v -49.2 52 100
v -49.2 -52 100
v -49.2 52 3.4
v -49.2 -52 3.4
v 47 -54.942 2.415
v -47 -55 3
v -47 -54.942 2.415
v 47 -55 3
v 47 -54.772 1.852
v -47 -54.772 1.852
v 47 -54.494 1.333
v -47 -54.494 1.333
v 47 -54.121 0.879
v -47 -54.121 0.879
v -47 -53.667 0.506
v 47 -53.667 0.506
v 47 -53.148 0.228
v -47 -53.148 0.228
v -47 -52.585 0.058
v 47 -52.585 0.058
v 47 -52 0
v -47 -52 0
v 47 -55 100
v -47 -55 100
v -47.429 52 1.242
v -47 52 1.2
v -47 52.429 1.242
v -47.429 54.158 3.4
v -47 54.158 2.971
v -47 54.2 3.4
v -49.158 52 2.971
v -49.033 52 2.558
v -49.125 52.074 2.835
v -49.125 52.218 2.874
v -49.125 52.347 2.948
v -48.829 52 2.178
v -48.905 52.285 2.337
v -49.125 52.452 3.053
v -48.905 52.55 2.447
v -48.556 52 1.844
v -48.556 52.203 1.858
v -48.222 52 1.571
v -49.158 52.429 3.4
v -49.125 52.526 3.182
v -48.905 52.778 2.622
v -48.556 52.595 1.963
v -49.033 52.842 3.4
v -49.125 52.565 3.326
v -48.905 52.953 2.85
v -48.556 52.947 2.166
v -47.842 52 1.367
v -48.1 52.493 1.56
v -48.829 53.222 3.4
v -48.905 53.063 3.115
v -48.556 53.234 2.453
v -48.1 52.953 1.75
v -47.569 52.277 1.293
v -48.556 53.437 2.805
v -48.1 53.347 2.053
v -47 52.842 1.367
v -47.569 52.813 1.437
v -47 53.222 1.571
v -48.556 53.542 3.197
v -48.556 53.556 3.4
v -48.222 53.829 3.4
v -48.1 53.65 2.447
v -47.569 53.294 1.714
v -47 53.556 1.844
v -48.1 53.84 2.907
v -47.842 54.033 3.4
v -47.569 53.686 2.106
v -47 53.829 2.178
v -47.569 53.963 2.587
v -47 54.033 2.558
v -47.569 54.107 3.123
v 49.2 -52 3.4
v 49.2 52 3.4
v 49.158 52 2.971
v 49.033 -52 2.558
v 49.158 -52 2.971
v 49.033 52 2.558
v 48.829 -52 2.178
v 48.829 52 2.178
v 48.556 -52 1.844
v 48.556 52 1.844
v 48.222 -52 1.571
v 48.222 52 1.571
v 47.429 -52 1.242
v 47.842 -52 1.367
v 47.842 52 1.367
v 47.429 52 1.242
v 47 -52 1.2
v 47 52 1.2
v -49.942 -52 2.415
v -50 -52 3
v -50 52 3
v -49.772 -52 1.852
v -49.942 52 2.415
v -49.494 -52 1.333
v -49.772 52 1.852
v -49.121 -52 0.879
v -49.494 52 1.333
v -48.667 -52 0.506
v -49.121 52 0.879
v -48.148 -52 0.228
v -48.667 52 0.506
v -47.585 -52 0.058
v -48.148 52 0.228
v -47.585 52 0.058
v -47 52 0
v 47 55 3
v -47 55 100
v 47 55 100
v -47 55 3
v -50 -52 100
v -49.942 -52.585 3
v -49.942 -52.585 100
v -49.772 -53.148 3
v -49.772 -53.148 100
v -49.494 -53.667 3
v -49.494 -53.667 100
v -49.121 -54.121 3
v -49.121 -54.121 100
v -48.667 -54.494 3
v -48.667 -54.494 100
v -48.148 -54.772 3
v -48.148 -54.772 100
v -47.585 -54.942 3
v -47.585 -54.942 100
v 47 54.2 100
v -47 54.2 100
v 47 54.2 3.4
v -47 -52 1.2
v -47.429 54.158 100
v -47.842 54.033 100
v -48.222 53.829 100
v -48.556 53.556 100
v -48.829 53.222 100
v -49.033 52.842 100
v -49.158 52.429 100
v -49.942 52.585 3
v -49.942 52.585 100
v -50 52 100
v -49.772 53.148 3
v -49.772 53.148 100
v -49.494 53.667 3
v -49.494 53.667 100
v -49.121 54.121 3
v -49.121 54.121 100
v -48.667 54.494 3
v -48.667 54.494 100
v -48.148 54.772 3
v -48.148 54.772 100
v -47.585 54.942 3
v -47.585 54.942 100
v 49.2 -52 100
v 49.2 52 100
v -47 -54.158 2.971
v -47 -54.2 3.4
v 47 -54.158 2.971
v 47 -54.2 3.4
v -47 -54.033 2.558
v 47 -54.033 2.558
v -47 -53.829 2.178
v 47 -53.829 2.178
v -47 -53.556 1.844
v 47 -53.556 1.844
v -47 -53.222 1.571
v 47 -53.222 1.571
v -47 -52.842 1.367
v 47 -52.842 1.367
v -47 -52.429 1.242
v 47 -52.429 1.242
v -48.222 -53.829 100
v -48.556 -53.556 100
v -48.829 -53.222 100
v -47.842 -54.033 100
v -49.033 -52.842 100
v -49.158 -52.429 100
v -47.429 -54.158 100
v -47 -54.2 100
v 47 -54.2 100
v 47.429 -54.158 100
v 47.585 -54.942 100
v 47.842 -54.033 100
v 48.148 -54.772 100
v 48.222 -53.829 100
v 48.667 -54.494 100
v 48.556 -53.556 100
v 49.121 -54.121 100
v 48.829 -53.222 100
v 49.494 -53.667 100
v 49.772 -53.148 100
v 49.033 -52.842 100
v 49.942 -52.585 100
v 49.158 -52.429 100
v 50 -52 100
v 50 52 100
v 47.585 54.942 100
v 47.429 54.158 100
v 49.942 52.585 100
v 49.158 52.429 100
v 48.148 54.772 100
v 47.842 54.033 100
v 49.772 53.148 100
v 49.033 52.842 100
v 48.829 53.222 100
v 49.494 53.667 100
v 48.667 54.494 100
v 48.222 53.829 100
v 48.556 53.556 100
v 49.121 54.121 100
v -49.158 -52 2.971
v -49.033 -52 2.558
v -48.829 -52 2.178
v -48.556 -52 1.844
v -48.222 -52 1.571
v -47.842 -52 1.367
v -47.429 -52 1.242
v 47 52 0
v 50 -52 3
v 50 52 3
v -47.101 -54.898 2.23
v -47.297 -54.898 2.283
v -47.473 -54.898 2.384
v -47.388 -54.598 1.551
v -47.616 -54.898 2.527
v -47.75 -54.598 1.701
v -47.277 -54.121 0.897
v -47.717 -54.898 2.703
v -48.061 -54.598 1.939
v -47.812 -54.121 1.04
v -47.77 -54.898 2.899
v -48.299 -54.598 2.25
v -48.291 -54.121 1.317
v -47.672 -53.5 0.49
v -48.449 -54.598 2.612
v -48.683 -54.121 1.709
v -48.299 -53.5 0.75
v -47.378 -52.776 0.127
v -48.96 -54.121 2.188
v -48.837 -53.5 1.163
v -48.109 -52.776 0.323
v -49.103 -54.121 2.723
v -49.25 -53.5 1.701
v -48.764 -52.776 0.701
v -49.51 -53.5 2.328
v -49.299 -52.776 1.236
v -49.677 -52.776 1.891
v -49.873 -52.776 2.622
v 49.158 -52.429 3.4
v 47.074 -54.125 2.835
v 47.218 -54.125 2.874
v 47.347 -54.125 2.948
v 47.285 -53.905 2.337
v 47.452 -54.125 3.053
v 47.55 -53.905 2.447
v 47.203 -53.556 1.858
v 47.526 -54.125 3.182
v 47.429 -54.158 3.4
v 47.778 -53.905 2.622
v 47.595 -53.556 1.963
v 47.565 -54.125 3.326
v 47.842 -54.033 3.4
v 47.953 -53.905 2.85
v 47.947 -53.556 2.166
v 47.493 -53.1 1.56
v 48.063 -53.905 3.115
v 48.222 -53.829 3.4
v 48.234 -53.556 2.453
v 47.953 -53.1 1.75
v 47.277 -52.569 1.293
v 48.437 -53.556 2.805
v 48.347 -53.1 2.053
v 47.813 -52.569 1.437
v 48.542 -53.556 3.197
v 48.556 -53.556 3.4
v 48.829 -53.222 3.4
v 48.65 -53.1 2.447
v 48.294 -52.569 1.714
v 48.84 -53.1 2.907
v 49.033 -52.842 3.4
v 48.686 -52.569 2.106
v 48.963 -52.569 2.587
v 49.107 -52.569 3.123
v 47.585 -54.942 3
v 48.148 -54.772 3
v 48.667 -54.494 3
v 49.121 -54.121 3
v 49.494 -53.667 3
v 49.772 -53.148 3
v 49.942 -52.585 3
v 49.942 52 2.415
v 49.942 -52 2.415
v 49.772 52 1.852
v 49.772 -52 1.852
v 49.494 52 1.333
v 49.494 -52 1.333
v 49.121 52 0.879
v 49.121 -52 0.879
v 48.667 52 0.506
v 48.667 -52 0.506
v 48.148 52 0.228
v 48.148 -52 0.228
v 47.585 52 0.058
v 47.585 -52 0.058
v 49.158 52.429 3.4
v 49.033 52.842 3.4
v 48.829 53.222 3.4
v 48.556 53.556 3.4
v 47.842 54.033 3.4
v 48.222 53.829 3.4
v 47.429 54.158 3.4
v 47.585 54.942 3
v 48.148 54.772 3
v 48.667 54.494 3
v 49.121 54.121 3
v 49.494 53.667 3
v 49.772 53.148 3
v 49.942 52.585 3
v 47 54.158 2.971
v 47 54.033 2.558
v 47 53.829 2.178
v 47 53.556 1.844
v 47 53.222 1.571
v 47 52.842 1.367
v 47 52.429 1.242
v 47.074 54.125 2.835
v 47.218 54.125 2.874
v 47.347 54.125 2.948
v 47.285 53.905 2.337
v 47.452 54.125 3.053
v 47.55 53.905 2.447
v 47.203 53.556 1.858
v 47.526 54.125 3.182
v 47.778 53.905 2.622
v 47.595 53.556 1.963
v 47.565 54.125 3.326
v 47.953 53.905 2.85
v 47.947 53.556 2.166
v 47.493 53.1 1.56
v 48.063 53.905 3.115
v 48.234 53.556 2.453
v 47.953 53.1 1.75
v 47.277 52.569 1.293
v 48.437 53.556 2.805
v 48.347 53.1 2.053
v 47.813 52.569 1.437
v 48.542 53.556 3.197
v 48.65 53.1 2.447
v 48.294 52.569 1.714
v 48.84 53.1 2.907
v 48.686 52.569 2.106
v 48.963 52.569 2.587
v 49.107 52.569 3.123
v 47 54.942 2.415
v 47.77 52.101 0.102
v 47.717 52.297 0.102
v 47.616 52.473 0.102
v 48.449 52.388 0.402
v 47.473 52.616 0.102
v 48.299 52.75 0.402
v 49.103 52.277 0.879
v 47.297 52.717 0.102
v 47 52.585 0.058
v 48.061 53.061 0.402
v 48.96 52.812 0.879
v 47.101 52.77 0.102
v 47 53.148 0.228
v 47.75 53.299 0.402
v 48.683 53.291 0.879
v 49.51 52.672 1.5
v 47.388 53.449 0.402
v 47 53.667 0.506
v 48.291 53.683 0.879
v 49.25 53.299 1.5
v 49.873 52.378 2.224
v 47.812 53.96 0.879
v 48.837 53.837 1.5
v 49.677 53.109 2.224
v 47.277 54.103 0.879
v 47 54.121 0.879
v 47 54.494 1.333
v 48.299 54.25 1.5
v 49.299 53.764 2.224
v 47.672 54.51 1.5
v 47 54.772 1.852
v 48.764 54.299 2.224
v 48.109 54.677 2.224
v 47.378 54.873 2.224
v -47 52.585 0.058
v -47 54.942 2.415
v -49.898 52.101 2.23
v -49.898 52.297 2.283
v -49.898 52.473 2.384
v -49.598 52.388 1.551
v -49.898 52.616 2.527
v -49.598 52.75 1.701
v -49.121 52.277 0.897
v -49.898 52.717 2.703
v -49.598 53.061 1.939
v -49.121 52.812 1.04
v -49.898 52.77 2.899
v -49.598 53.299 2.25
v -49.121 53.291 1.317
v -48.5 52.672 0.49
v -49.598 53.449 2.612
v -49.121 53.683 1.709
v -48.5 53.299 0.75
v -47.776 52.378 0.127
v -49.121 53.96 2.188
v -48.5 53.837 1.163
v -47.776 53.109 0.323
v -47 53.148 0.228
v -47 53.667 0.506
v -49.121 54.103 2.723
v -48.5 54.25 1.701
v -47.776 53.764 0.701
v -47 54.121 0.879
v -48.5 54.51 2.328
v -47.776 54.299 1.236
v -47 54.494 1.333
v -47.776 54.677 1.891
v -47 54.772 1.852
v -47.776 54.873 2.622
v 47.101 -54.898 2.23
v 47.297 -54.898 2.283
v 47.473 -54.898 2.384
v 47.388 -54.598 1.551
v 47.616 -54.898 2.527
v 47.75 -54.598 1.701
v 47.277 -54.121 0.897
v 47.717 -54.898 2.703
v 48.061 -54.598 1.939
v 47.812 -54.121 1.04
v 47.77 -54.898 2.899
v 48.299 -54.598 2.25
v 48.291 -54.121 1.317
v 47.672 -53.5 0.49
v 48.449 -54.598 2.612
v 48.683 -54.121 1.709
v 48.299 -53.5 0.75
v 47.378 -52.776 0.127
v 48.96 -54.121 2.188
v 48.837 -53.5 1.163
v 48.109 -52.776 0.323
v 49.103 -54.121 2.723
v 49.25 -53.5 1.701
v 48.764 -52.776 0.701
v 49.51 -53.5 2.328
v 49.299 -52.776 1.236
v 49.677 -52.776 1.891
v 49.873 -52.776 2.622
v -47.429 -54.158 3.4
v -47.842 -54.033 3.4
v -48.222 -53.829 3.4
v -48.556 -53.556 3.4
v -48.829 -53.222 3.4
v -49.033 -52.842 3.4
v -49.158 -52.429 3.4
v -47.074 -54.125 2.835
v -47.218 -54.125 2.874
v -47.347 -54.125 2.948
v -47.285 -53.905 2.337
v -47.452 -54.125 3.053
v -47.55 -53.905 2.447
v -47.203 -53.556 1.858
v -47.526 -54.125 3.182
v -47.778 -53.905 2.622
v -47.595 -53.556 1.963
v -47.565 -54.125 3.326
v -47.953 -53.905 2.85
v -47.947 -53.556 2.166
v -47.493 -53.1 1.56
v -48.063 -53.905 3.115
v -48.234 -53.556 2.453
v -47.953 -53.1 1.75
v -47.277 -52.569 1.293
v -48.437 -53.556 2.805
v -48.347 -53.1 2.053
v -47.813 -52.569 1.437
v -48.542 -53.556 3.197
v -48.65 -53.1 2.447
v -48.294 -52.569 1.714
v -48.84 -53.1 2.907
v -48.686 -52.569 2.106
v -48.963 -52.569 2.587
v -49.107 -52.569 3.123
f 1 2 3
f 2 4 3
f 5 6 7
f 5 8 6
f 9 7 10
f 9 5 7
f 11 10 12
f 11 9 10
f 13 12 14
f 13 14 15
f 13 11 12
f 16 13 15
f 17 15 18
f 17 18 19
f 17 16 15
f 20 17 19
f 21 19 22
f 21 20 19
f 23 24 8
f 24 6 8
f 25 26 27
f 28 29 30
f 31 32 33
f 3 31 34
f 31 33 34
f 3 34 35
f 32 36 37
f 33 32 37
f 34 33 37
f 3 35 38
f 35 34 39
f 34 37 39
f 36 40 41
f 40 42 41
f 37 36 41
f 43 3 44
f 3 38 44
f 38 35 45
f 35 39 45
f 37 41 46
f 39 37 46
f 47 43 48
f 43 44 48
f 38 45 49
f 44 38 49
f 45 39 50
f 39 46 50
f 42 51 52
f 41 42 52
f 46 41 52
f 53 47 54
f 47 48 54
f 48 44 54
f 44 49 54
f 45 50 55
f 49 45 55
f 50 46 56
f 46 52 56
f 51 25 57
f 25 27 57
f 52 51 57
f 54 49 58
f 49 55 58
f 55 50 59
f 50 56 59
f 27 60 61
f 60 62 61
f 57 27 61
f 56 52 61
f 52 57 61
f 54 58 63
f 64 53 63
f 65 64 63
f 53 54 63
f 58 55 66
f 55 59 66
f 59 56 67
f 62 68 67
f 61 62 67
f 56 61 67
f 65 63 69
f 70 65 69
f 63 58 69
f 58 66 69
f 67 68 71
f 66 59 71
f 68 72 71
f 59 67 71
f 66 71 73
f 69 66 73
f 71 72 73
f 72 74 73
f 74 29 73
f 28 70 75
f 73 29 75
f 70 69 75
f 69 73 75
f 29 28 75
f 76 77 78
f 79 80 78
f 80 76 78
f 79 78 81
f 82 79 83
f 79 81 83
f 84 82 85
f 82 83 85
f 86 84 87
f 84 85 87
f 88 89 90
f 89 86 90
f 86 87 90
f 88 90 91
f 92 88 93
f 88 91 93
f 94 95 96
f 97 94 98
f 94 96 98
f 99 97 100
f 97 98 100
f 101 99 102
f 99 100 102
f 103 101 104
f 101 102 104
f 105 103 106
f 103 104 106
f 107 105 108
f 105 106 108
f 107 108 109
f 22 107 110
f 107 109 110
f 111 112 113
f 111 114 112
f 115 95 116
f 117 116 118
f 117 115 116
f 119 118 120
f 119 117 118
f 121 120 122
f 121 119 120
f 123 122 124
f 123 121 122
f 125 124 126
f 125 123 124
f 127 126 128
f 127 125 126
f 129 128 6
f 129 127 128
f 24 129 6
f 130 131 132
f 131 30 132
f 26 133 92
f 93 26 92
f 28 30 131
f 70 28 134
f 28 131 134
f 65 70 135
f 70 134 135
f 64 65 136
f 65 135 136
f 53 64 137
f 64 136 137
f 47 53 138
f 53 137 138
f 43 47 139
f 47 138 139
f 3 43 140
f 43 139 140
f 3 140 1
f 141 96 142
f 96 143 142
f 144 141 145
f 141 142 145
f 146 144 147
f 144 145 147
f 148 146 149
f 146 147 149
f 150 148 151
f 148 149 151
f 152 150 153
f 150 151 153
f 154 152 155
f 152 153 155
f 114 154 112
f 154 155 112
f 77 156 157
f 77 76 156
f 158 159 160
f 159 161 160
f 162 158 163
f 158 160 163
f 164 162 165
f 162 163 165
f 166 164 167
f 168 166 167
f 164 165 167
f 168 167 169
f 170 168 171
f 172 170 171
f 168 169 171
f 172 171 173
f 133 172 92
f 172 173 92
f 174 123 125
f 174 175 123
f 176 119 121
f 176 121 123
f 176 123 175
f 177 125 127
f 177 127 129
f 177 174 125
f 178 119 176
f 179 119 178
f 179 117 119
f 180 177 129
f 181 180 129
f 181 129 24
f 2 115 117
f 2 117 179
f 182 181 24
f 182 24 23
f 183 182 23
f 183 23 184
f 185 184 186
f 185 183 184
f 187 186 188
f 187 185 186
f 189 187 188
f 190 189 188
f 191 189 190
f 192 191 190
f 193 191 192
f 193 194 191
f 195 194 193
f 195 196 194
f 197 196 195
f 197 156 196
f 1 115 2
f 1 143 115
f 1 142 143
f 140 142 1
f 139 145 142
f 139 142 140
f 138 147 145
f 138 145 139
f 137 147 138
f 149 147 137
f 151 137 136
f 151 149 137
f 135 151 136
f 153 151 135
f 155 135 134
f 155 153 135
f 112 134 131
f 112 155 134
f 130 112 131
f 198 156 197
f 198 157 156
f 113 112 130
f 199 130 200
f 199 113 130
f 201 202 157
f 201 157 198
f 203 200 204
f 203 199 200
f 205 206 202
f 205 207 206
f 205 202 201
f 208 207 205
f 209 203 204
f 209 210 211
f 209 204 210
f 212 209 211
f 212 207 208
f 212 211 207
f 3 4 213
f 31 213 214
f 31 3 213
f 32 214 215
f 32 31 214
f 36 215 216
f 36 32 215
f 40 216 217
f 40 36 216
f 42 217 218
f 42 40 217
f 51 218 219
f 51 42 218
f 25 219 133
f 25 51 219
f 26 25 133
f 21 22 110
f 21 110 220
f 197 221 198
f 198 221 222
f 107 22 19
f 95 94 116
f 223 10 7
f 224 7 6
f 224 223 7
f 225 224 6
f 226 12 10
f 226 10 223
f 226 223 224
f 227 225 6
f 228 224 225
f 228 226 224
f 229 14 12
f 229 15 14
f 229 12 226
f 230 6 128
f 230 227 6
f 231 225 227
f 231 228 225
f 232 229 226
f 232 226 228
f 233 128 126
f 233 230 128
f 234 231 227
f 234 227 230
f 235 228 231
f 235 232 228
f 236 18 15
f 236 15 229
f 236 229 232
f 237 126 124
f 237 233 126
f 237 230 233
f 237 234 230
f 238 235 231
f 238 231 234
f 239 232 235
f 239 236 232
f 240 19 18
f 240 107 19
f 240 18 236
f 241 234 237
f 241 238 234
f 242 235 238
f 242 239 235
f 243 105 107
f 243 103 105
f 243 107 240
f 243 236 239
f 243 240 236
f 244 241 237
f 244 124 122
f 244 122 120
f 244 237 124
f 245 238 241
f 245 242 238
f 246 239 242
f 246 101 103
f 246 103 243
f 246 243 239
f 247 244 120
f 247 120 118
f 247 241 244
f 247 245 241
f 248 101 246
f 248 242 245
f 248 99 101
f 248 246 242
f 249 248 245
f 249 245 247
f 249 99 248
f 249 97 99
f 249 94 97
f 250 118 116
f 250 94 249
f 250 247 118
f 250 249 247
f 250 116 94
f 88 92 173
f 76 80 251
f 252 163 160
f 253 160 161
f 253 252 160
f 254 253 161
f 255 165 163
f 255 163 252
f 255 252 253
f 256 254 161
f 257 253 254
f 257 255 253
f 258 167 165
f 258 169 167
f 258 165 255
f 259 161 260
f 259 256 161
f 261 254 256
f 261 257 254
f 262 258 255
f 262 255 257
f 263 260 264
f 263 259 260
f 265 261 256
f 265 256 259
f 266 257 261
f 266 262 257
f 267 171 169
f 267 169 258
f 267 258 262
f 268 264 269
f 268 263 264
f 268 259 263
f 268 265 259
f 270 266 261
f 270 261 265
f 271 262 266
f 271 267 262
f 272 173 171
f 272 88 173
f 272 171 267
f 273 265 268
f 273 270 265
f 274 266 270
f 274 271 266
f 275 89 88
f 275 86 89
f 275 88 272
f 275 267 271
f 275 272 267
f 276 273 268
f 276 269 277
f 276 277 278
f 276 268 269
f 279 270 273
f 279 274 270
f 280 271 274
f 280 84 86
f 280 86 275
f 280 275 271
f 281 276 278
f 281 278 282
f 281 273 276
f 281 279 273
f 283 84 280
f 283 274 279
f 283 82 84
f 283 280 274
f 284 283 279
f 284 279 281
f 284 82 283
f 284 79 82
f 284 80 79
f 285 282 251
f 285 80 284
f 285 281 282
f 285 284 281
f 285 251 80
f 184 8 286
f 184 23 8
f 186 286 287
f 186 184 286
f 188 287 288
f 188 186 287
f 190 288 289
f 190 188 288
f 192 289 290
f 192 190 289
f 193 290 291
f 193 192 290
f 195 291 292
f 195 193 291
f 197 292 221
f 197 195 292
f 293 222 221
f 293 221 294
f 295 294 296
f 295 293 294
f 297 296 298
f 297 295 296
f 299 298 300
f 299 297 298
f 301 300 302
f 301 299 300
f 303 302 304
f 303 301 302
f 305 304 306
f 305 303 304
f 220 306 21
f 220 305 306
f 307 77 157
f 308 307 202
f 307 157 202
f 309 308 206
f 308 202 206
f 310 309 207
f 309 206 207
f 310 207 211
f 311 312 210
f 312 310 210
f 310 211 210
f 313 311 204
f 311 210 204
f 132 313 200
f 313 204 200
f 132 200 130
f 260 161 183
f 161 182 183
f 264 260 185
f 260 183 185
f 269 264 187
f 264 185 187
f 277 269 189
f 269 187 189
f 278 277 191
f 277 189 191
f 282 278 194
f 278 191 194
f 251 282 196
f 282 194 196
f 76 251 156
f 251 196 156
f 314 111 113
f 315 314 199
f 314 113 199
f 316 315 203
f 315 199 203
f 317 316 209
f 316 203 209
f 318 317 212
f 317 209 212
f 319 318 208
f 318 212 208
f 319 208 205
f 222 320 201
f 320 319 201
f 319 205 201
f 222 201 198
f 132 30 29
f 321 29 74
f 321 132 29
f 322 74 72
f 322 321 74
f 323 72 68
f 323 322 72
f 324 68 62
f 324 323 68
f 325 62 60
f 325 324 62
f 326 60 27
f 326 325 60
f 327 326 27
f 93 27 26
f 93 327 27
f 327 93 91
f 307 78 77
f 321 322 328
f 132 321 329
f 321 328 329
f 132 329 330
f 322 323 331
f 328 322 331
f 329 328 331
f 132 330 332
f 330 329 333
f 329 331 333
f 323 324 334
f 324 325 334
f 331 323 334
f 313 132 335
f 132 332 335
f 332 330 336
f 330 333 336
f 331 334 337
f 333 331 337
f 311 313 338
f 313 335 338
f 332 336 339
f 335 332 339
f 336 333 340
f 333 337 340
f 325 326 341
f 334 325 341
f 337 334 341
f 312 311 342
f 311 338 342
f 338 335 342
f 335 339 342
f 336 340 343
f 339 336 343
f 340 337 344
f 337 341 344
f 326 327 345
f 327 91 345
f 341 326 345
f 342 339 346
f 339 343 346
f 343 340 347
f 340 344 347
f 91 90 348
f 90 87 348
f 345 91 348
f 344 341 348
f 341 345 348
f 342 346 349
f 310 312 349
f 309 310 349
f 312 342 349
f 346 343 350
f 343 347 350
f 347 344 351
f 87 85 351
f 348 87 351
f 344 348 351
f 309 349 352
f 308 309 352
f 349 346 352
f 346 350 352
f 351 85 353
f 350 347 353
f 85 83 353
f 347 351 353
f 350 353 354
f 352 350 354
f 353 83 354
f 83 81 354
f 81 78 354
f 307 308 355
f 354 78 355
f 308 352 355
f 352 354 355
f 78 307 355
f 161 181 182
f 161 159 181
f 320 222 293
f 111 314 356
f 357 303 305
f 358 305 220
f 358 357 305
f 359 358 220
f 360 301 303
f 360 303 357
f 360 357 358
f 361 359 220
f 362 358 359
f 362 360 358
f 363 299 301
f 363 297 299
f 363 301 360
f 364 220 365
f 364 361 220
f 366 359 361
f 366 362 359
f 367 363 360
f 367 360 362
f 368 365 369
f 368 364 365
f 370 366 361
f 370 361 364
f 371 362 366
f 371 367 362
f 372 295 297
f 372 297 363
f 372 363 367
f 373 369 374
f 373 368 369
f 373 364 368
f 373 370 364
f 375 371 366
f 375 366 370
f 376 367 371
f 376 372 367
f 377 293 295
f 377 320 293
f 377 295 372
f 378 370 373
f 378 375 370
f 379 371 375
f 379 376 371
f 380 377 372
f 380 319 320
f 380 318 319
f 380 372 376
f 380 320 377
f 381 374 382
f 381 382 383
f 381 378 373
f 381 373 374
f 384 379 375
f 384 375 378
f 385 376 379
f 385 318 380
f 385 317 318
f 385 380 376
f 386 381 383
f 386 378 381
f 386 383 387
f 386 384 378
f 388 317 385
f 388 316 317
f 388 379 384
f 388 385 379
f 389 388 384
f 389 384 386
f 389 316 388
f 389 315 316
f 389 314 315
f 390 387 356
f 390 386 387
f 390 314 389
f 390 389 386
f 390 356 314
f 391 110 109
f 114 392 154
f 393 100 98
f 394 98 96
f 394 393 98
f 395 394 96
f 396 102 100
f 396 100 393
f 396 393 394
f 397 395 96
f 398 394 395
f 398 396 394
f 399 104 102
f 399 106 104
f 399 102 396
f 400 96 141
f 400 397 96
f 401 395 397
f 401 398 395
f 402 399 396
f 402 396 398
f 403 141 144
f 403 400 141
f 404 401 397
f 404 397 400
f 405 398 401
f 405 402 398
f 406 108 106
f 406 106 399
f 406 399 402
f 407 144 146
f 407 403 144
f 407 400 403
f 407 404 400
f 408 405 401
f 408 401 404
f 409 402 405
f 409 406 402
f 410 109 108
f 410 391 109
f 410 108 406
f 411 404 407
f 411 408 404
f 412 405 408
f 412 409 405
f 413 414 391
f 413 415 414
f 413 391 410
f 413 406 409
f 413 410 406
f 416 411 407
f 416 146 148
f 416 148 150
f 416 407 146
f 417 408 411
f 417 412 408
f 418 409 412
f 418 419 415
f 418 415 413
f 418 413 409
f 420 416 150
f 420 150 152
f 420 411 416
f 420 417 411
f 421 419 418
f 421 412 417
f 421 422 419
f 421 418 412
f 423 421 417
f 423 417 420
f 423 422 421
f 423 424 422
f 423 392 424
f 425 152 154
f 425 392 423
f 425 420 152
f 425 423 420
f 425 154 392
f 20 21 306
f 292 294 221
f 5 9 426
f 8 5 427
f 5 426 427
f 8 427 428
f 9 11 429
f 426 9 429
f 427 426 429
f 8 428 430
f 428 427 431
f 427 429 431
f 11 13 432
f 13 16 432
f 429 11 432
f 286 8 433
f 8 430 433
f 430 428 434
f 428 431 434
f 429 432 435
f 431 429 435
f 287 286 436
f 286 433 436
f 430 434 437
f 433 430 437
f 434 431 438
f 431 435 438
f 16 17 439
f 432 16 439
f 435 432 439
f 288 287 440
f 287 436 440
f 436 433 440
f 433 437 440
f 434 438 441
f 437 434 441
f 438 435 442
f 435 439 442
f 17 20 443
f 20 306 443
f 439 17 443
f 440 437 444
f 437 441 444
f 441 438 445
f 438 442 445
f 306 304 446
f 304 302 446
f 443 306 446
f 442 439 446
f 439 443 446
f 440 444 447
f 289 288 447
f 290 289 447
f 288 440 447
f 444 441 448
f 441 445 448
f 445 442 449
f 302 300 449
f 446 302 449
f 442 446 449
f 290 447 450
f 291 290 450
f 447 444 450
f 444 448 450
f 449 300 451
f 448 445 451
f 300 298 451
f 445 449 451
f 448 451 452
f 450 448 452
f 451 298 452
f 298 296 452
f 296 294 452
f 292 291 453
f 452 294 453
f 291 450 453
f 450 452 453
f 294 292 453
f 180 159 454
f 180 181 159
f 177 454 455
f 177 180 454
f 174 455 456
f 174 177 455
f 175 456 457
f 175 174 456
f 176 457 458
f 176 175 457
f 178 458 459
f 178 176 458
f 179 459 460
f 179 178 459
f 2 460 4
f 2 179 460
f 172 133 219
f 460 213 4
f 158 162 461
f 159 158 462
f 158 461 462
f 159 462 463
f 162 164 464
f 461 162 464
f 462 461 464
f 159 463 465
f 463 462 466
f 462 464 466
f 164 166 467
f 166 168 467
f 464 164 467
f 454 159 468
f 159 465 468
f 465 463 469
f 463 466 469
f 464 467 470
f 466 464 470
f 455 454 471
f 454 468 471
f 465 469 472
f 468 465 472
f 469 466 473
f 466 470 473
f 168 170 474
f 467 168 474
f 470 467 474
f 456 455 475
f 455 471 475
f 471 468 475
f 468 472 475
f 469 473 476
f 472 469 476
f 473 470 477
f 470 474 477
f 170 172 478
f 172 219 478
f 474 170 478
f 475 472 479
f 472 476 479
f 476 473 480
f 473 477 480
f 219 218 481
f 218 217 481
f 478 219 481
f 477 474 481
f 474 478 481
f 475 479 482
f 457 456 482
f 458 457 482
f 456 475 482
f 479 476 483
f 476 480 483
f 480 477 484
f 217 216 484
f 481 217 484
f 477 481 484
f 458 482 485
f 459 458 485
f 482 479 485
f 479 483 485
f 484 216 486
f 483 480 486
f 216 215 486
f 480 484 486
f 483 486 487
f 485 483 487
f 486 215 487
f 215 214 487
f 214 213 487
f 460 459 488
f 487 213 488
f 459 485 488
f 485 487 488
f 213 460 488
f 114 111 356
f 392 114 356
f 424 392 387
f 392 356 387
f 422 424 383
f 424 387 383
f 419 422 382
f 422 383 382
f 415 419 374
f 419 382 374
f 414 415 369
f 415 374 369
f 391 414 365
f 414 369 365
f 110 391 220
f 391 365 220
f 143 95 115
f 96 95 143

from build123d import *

# Parameters (mm, degrees)
F0_W     = 98.4
F0_H     = 108.4
F1_DEPTH = 1.2
F0_W_2   = 100
F0_H_2   = 110
F2_DEPTH = 100
F3_R     = 2.2
F4_R     = 3


with BuildPart() as f1:
    # F0 (on Top) → F1 (new body)
    with BuildSketch(Plane.XY):
        Rectangle(F0_W, F0_H)
    extrude(amount=F1_DEPTH)

    # F0 (on Top) → F2 (join)
    with BuildSketch(Plane.XY):
        Rectangle(F0_W_2, F0_H_2)
        Rectangle(F0_W, F0_H, mode=Mode.SUBTRACT)
    extrude(amount=F2_DEPTH)

    # F3
    f3_edges = [f1.edges().sort_by_distance(p)[0] for p in [
        (49.2, 0, 1.2),
        (0, 54.2, 1.2),
        (-49.2, 0, 1.2),
        (0, -54.2, 1.2),
        (-49.2, 54.2, 50.6),
        (-49.2, -54.2, 50.6),
        (49.2, -54.2, 50.6),
        (49.2, 54.2, 50.6),
    ]]
    fillet(f3_edges, radius=F3_R)

    # F4
    f4_edges = [f1.edges().sort_by_distance(p)[0] for p in [
        (50, 55, 50),
        (50, 0, 0),
        (0, 55, 0),
        (-50, 0, 0),
        (0, -55, 0),
        (-50, 55, 50),
        (-50, -55, 50),
        (50, -55, 50),
    ]]
    fillet(f4_edges, radius=F4_R)


solid = f1.part
